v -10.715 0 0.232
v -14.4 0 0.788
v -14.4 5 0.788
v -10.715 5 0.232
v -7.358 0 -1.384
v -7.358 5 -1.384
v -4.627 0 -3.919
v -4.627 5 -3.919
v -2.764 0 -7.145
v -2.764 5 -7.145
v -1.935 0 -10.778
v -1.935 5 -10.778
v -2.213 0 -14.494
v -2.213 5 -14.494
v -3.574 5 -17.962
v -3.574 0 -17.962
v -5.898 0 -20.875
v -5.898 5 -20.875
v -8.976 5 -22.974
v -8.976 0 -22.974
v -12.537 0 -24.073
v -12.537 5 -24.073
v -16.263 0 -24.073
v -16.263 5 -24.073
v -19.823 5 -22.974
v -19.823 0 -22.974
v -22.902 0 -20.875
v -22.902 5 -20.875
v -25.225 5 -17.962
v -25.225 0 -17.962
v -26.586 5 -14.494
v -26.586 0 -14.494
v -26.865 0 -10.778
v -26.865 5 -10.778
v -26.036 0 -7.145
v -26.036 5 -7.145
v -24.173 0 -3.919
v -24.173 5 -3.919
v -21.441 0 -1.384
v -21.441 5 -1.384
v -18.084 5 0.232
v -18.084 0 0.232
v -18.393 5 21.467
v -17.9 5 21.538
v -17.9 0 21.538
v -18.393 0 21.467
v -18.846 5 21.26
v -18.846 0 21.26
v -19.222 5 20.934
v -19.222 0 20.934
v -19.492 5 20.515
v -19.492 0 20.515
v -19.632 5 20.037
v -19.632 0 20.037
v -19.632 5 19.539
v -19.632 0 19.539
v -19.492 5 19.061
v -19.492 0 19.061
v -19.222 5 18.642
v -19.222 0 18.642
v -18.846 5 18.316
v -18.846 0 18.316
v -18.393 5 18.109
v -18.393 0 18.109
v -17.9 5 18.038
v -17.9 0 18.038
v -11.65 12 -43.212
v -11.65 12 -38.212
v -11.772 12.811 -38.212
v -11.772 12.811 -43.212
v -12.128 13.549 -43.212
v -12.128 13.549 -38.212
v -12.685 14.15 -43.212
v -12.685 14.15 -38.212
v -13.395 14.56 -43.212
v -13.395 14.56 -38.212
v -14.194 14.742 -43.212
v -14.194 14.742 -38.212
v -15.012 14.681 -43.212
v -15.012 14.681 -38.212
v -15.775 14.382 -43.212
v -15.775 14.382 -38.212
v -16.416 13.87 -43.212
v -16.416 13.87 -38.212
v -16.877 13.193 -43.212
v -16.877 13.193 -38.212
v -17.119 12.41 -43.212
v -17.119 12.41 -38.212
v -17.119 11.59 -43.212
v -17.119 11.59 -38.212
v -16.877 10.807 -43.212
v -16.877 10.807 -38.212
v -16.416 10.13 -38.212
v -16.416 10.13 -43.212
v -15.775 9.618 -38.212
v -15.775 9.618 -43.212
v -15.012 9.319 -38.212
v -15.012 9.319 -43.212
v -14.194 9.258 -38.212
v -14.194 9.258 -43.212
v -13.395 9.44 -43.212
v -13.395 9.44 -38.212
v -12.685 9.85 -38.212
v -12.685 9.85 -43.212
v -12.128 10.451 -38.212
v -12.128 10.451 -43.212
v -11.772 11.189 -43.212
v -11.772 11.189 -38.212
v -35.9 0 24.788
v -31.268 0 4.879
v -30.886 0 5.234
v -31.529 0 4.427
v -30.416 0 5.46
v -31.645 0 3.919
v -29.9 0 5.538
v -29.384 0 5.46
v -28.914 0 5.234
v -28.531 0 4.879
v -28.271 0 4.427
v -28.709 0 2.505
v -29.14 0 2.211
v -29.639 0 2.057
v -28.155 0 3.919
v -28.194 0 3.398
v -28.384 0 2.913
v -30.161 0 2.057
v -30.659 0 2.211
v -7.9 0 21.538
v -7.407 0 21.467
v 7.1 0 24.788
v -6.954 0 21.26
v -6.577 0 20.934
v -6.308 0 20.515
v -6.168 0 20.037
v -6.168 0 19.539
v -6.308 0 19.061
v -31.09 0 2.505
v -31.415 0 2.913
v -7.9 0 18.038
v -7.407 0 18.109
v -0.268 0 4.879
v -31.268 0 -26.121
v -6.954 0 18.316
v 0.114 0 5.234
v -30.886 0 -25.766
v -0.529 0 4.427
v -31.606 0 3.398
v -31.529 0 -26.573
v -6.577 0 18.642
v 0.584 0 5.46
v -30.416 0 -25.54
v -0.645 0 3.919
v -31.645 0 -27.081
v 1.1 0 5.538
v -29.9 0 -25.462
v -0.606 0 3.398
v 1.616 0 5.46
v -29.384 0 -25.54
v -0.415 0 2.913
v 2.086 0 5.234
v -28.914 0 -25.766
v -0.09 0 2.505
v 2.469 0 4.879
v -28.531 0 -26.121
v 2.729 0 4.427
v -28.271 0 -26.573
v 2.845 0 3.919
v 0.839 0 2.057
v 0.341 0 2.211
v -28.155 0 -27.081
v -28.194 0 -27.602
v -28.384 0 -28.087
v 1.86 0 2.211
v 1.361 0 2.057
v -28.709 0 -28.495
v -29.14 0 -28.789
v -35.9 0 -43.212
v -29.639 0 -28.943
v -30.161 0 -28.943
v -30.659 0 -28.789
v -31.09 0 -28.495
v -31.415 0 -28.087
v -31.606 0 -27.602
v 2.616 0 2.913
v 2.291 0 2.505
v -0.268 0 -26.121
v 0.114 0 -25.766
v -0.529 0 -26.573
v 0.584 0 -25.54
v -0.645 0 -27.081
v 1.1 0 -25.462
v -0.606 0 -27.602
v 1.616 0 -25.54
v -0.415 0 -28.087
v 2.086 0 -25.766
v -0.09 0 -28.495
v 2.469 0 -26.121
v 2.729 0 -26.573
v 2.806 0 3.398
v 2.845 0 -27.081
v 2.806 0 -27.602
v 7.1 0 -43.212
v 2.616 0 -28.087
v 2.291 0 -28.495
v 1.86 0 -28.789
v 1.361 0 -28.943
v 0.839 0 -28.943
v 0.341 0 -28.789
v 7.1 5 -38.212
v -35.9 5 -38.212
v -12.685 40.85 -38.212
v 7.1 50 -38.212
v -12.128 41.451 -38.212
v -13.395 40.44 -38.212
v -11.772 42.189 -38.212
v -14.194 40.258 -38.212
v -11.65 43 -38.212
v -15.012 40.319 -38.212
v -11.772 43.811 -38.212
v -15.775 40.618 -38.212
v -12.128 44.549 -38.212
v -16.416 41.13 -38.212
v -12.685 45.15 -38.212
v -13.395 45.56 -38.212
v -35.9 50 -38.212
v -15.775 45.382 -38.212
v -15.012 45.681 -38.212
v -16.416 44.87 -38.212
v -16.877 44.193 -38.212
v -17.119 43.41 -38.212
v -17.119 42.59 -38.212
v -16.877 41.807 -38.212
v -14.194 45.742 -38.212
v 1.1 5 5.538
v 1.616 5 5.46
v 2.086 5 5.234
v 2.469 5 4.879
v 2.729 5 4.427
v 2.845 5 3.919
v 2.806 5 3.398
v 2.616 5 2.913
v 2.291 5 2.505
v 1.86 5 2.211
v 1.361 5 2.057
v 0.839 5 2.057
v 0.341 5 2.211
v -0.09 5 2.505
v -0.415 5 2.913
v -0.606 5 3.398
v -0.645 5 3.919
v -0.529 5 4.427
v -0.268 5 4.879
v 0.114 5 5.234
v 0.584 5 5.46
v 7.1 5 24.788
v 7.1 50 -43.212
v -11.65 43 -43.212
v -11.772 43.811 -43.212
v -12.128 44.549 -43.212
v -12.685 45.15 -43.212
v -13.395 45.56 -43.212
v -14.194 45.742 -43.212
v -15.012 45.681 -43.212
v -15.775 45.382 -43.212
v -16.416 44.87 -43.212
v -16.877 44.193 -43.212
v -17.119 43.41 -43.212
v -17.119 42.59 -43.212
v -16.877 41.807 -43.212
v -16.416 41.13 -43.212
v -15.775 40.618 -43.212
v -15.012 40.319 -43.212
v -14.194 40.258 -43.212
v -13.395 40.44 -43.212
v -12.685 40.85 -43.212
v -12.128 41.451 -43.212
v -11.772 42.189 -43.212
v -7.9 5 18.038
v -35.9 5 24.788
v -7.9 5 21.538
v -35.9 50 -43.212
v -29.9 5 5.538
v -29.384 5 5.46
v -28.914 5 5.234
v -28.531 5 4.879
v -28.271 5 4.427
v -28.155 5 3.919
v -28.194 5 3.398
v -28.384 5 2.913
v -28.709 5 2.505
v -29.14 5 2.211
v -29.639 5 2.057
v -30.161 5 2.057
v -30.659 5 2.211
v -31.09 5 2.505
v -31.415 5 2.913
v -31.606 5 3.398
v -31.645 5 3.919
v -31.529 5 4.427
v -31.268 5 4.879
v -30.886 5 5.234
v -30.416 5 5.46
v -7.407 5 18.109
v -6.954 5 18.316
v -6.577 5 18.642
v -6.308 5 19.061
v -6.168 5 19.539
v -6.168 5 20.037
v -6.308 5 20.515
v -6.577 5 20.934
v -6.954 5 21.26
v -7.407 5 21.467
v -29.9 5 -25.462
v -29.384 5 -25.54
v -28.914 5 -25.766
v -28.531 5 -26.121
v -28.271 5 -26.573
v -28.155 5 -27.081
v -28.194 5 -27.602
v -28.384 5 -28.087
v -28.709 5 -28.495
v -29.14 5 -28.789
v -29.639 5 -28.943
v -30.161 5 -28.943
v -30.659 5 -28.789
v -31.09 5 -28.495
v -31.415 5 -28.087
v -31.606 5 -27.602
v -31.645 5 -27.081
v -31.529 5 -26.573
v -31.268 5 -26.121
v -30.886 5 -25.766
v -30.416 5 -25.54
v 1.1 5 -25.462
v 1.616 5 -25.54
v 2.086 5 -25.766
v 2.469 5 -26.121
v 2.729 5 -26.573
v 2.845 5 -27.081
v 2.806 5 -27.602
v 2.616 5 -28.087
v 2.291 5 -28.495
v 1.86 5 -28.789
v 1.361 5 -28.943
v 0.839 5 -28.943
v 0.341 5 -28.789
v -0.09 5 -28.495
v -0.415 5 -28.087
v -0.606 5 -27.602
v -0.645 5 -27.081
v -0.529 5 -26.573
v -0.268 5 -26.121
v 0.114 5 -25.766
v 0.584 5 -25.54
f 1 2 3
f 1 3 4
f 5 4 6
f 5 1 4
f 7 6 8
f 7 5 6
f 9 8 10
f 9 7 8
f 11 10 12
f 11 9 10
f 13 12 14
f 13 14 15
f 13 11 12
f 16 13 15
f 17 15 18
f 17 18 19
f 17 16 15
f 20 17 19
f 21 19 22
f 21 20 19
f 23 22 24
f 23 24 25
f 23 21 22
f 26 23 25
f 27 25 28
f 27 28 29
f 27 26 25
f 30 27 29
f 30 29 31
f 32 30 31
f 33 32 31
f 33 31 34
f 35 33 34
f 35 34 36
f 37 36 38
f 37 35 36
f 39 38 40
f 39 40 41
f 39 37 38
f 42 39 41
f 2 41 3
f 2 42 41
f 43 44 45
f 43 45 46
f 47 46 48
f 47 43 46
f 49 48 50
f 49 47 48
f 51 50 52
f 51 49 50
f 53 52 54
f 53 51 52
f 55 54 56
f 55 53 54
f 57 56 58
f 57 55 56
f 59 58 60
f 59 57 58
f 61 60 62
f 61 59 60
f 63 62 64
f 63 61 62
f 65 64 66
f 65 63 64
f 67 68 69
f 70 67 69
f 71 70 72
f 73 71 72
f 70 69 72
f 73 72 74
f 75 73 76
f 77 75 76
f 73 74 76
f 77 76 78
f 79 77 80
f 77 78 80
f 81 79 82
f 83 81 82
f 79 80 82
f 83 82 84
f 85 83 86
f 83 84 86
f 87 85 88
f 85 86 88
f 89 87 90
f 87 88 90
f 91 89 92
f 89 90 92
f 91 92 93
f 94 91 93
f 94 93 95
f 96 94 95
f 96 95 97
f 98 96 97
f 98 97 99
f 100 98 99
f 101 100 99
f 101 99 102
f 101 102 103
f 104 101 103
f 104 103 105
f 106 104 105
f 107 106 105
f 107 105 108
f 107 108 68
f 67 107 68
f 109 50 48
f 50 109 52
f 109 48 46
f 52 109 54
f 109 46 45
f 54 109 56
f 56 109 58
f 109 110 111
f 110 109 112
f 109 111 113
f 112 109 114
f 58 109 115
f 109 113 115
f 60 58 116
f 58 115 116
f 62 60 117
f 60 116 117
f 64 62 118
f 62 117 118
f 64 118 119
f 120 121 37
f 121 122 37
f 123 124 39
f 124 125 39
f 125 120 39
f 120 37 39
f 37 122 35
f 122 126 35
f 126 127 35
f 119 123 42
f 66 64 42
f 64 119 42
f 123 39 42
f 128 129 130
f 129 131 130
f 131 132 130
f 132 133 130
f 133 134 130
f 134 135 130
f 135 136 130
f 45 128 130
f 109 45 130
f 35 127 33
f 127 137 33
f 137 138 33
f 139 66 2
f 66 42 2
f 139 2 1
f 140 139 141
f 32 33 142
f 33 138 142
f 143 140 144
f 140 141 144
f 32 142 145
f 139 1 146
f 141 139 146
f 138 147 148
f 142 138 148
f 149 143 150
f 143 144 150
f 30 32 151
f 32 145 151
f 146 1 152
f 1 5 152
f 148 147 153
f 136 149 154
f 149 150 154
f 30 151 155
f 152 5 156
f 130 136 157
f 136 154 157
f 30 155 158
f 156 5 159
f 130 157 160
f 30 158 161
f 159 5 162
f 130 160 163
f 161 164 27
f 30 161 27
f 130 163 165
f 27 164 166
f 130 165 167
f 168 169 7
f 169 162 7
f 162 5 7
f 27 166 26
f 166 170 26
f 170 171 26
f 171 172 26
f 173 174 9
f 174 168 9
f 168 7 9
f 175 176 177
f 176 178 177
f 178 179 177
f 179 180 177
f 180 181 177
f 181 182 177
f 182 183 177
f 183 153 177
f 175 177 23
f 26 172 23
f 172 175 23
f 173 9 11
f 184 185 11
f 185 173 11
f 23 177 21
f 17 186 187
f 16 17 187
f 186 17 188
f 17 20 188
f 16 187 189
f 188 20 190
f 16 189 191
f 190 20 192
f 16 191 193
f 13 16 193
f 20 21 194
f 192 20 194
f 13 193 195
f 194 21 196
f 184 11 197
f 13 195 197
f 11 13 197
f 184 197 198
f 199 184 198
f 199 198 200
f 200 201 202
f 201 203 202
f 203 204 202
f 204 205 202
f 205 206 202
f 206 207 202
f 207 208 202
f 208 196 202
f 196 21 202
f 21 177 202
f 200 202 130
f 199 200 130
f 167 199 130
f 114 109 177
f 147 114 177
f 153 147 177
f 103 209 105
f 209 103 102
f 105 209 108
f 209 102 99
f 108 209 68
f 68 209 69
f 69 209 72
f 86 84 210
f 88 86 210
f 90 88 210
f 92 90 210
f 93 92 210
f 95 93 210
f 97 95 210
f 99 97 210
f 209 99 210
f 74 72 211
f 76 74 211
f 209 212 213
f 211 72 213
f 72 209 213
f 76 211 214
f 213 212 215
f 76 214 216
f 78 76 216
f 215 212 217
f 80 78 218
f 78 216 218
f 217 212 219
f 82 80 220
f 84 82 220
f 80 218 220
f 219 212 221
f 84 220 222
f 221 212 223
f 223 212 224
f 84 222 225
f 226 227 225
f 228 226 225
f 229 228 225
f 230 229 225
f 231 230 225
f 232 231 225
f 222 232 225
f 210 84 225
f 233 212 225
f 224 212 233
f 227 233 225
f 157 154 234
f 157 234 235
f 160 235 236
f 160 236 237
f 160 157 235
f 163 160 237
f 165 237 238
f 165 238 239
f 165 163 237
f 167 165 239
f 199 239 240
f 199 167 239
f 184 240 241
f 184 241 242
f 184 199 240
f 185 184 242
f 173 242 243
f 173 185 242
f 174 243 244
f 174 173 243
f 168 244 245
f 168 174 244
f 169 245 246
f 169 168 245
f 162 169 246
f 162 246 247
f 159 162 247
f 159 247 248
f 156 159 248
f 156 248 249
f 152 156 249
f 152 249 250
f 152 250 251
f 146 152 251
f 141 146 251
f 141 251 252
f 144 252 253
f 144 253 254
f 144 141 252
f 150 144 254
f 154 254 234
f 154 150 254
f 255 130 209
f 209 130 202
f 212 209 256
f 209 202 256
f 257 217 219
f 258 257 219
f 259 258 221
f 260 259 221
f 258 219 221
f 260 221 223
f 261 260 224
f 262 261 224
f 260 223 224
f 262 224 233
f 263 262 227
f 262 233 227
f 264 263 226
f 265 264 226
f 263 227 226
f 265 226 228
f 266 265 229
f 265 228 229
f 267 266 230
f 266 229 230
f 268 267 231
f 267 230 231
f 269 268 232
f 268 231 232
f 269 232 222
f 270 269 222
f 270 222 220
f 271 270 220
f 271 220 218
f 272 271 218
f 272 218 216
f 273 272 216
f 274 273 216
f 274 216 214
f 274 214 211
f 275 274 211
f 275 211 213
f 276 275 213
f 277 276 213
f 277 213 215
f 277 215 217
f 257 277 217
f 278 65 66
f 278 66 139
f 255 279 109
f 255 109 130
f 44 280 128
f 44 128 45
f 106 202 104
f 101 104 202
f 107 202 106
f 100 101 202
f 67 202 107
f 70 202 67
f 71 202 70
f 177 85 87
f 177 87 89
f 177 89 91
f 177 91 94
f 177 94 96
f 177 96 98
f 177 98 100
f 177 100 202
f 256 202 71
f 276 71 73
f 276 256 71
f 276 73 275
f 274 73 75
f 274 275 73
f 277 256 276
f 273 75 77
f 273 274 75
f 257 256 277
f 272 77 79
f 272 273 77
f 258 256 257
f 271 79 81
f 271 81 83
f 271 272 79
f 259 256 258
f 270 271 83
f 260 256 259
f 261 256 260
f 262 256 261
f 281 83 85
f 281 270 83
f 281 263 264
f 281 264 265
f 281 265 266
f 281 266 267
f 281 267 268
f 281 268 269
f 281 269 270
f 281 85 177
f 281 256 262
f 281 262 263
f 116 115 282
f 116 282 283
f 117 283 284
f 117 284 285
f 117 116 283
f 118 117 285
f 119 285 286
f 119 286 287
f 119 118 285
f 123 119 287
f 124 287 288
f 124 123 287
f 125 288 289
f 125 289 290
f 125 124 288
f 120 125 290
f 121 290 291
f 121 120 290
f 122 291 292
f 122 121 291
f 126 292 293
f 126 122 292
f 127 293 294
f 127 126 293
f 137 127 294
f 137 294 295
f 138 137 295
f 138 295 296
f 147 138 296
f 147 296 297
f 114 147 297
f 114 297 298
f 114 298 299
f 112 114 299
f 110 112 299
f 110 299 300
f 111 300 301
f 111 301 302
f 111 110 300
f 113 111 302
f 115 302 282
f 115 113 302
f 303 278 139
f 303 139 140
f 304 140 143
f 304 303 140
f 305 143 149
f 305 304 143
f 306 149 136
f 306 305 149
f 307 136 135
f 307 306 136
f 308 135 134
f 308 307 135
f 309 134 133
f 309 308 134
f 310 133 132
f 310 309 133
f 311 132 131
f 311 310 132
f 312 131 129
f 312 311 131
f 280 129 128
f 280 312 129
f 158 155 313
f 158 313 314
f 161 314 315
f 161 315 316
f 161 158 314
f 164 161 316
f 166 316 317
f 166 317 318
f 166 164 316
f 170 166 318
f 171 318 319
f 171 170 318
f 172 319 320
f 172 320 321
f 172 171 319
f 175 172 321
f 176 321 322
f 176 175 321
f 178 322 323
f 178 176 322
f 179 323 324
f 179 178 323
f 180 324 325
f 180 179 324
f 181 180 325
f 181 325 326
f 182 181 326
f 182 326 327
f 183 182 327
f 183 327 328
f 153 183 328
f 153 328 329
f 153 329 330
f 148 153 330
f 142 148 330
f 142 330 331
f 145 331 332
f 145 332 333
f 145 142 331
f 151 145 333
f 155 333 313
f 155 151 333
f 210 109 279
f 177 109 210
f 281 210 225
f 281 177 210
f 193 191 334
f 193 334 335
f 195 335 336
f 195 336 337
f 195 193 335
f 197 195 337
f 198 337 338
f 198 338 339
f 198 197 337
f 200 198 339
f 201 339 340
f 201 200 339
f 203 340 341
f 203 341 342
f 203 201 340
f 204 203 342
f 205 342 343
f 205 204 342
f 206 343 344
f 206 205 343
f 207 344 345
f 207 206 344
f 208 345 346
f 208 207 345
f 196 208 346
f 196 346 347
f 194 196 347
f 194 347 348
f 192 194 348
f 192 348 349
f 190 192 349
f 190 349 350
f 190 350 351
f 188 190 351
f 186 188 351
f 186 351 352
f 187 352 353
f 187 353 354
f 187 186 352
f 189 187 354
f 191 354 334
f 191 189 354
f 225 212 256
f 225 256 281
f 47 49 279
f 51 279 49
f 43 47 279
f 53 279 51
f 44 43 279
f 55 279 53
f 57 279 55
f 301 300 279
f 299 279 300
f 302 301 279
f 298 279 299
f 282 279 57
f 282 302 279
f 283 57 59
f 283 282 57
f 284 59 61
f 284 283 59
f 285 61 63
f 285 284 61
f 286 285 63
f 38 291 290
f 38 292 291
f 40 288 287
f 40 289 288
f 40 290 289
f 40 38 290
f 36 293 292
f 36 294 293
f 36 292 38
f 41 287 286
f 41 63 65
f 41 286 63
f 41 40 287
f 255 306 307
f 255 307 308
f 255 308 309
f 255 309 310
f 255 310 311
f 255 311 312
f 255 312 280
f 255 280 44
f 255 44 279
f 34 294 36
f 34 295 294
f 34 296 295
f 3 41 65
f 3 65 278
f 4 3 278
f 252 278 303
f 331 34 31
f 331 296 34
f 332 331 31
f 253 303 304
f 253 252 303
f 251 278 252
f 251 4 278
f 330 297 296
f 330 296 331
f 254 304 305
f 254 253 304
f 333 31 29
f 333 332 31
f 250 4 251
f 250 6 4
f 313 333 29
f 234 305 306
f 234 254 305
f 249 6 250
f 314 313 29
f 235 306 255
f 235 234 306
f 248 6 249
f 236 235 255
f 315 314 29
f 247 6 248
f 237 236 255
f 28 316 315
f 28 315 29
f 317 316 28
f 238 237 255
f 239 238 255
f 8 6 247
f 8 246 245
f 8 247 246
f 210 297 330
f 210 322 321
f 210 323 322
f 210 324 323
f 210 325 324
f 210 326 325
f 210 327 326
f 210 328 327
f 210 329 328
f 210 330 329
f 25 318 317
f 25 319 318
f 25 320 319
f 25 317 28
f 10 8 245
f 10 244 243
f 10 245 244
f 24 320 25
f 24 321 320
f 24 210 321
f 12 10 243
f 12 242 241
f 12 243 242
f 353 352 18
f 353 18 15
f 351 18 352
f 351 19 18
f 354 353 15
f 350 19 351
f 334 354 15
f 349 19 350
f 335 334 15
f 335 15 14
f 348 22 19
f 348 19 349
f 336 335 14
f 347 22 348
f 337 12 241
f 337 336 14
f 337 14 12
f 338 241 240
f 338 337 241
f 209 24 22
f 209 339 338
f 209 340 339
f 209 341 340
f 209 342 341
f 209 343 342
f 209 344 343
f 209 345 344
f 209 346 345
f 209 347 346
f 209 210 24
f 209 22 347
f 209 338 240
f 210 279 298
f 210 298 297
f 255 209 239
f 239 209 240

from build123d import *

# Parameters (mm, degrees)
SKETCH_1_W          = 43
SKETCH_1_H          = 43
SKETCH_1_R          = 1.75
SKETCH_1_R_2        = 12.5
EXTRUDE_1_DEPTH     = 5
SKETCH_3_W          = 43
SKETCH_3_H          = 5
EXTRUDE_2_DEPTH     = 5
SKETCH_4_W          = 43
SKETCH_4_H          = 50
EXTRUDE_3_DEPTH     = 5
SKETCH_5_R          = 2.75
CUT_EXTRUDE_1_DEPTH = 79.056311978
SKETCH_6_W          = 43
SKETCH_6_H          = 5
EXTRUDE_4_DEPTH     = 15
CUT_EXTRUDE_2_DEPTH = 72.979728546


with BuildPart() as part:
    # 草图1 → 凸台-拉伸1 (new body)
    with BuildSketch(Plane(origin=(0, 0, 0), x_dir=(1, 0, 0), z_dir=(0, 1, 0))):
        with Locations((-14.399691358, 11.712191358)):
            Rectangle(SKETCH_1_W, SKETCH_1_H)
        with Locations(Location((1.100308642, 27.212191358, 0), (0, 0, 270))):
            Circle(SKETCH_1_R, mode=Mode.SUBTRACT)
        with Locations(Location((-29.899691358, 27.212191358, 0), (0, 0, 270))):
            Circle(SKETCH_1_R, mode=Mode.SUBTRACT)
        with Locations(Location((-29.899691358, -3.787808642, 0), (0, 0, 270))):
            Circle(SKETCH_1_R, mode=Mode.SUBTRACT)
        with Locations(Location((1.100308642, -3.787808642, 0), (0, 0, 270))):
            Circle(SKETCH_1_R, mode=Mode.SUBTRACT)
        with Locations(Location((-14.399691358, 11.712191358, 0), (0, 0, 270))):
            Circle(SKETCH_1_R_2, mode=Mode.SUBTRACT)
    extrude(amount=EXTRUDE_1_DEPTH)

    # 草图3 → 凸台-拉伸2 (add)
    with BuildSketch(Plane(origin=(0, 0, -33.212191358), x_dir=(-1, 0, 0), z_dir=(0, 0, -1))):
        with Locations((14.399691358, 2.5)):
            Rectangle(SKETCH_3_W, SKETCH_3_H)
    extrude(amount=EXTRUDE_2_DEPTH)

    # 草图4 → 凸台-拉伸3 (add)
    with BuildSketch(Plane(origin=(0, 0, -38.212191358), x_dir=(-1, 0, 0), z_dir=(0, 0, -1))):
        with Locations((14.399691358, 25)):
            Rectangle(SKETCH_4_W, SKETCH_4_H)
    extrude(amount=EXTRUDE_3_DEPTH)

    # 草图5 → 切除-拉伸1 (cut, through all)
    with BuildSketch(Plane.XY.offset(-38.212191358)):
        with Locations((-14.399691358, 43)):
            Circle(SKETCH_5_R)
        with Locations((-14.399691358, 12)):
            Circle(SKETCH_5_R)
    extrude(amount=-CUT_EXTRUDE_1_DEPTH, mode=Mode.SUBTRACT)

    # 草图6 → 凸台-拉伸4 (add)
    with BuildSketch(Plane.XY.offset(9.787808642)):
        with Locations((-14.399691358, 2.5)):
            Rectangle(SKETCH_6_W, SKETCH_6_H)
    extrude(amount=EXTRUDE_4_DEPTH)

    # 草图7 → 切除-拉伸2 (cut, through all)
    with BuildSketch(Plane(origin=(0, 5, 0), x_dir=(1, 0, 0), z_dir=(0, 1, 0))):
        with BuildLine():
            Line((-17.899691358, -18.037808642), (-7.899691358, -18.037808642))
            ThreePointArc((-7.899691358, -18.037808642), (-6.149691358, -19.787808642), (-7.899691358, -21.537808642))
            Line((-7.899691358, -21.537808642), (-17.899691358, -21.537808642))
            ThreePointArc((-17.899691358, -21.537808642), (-19.649691358, -19.787808642), (-17.899691358, -18.037808642))
        make_face()
    extrude(amount=-CUT_EXTRUDE_2_DEPTH, mode=Mode.SUBTRACT)


solid = part.part
